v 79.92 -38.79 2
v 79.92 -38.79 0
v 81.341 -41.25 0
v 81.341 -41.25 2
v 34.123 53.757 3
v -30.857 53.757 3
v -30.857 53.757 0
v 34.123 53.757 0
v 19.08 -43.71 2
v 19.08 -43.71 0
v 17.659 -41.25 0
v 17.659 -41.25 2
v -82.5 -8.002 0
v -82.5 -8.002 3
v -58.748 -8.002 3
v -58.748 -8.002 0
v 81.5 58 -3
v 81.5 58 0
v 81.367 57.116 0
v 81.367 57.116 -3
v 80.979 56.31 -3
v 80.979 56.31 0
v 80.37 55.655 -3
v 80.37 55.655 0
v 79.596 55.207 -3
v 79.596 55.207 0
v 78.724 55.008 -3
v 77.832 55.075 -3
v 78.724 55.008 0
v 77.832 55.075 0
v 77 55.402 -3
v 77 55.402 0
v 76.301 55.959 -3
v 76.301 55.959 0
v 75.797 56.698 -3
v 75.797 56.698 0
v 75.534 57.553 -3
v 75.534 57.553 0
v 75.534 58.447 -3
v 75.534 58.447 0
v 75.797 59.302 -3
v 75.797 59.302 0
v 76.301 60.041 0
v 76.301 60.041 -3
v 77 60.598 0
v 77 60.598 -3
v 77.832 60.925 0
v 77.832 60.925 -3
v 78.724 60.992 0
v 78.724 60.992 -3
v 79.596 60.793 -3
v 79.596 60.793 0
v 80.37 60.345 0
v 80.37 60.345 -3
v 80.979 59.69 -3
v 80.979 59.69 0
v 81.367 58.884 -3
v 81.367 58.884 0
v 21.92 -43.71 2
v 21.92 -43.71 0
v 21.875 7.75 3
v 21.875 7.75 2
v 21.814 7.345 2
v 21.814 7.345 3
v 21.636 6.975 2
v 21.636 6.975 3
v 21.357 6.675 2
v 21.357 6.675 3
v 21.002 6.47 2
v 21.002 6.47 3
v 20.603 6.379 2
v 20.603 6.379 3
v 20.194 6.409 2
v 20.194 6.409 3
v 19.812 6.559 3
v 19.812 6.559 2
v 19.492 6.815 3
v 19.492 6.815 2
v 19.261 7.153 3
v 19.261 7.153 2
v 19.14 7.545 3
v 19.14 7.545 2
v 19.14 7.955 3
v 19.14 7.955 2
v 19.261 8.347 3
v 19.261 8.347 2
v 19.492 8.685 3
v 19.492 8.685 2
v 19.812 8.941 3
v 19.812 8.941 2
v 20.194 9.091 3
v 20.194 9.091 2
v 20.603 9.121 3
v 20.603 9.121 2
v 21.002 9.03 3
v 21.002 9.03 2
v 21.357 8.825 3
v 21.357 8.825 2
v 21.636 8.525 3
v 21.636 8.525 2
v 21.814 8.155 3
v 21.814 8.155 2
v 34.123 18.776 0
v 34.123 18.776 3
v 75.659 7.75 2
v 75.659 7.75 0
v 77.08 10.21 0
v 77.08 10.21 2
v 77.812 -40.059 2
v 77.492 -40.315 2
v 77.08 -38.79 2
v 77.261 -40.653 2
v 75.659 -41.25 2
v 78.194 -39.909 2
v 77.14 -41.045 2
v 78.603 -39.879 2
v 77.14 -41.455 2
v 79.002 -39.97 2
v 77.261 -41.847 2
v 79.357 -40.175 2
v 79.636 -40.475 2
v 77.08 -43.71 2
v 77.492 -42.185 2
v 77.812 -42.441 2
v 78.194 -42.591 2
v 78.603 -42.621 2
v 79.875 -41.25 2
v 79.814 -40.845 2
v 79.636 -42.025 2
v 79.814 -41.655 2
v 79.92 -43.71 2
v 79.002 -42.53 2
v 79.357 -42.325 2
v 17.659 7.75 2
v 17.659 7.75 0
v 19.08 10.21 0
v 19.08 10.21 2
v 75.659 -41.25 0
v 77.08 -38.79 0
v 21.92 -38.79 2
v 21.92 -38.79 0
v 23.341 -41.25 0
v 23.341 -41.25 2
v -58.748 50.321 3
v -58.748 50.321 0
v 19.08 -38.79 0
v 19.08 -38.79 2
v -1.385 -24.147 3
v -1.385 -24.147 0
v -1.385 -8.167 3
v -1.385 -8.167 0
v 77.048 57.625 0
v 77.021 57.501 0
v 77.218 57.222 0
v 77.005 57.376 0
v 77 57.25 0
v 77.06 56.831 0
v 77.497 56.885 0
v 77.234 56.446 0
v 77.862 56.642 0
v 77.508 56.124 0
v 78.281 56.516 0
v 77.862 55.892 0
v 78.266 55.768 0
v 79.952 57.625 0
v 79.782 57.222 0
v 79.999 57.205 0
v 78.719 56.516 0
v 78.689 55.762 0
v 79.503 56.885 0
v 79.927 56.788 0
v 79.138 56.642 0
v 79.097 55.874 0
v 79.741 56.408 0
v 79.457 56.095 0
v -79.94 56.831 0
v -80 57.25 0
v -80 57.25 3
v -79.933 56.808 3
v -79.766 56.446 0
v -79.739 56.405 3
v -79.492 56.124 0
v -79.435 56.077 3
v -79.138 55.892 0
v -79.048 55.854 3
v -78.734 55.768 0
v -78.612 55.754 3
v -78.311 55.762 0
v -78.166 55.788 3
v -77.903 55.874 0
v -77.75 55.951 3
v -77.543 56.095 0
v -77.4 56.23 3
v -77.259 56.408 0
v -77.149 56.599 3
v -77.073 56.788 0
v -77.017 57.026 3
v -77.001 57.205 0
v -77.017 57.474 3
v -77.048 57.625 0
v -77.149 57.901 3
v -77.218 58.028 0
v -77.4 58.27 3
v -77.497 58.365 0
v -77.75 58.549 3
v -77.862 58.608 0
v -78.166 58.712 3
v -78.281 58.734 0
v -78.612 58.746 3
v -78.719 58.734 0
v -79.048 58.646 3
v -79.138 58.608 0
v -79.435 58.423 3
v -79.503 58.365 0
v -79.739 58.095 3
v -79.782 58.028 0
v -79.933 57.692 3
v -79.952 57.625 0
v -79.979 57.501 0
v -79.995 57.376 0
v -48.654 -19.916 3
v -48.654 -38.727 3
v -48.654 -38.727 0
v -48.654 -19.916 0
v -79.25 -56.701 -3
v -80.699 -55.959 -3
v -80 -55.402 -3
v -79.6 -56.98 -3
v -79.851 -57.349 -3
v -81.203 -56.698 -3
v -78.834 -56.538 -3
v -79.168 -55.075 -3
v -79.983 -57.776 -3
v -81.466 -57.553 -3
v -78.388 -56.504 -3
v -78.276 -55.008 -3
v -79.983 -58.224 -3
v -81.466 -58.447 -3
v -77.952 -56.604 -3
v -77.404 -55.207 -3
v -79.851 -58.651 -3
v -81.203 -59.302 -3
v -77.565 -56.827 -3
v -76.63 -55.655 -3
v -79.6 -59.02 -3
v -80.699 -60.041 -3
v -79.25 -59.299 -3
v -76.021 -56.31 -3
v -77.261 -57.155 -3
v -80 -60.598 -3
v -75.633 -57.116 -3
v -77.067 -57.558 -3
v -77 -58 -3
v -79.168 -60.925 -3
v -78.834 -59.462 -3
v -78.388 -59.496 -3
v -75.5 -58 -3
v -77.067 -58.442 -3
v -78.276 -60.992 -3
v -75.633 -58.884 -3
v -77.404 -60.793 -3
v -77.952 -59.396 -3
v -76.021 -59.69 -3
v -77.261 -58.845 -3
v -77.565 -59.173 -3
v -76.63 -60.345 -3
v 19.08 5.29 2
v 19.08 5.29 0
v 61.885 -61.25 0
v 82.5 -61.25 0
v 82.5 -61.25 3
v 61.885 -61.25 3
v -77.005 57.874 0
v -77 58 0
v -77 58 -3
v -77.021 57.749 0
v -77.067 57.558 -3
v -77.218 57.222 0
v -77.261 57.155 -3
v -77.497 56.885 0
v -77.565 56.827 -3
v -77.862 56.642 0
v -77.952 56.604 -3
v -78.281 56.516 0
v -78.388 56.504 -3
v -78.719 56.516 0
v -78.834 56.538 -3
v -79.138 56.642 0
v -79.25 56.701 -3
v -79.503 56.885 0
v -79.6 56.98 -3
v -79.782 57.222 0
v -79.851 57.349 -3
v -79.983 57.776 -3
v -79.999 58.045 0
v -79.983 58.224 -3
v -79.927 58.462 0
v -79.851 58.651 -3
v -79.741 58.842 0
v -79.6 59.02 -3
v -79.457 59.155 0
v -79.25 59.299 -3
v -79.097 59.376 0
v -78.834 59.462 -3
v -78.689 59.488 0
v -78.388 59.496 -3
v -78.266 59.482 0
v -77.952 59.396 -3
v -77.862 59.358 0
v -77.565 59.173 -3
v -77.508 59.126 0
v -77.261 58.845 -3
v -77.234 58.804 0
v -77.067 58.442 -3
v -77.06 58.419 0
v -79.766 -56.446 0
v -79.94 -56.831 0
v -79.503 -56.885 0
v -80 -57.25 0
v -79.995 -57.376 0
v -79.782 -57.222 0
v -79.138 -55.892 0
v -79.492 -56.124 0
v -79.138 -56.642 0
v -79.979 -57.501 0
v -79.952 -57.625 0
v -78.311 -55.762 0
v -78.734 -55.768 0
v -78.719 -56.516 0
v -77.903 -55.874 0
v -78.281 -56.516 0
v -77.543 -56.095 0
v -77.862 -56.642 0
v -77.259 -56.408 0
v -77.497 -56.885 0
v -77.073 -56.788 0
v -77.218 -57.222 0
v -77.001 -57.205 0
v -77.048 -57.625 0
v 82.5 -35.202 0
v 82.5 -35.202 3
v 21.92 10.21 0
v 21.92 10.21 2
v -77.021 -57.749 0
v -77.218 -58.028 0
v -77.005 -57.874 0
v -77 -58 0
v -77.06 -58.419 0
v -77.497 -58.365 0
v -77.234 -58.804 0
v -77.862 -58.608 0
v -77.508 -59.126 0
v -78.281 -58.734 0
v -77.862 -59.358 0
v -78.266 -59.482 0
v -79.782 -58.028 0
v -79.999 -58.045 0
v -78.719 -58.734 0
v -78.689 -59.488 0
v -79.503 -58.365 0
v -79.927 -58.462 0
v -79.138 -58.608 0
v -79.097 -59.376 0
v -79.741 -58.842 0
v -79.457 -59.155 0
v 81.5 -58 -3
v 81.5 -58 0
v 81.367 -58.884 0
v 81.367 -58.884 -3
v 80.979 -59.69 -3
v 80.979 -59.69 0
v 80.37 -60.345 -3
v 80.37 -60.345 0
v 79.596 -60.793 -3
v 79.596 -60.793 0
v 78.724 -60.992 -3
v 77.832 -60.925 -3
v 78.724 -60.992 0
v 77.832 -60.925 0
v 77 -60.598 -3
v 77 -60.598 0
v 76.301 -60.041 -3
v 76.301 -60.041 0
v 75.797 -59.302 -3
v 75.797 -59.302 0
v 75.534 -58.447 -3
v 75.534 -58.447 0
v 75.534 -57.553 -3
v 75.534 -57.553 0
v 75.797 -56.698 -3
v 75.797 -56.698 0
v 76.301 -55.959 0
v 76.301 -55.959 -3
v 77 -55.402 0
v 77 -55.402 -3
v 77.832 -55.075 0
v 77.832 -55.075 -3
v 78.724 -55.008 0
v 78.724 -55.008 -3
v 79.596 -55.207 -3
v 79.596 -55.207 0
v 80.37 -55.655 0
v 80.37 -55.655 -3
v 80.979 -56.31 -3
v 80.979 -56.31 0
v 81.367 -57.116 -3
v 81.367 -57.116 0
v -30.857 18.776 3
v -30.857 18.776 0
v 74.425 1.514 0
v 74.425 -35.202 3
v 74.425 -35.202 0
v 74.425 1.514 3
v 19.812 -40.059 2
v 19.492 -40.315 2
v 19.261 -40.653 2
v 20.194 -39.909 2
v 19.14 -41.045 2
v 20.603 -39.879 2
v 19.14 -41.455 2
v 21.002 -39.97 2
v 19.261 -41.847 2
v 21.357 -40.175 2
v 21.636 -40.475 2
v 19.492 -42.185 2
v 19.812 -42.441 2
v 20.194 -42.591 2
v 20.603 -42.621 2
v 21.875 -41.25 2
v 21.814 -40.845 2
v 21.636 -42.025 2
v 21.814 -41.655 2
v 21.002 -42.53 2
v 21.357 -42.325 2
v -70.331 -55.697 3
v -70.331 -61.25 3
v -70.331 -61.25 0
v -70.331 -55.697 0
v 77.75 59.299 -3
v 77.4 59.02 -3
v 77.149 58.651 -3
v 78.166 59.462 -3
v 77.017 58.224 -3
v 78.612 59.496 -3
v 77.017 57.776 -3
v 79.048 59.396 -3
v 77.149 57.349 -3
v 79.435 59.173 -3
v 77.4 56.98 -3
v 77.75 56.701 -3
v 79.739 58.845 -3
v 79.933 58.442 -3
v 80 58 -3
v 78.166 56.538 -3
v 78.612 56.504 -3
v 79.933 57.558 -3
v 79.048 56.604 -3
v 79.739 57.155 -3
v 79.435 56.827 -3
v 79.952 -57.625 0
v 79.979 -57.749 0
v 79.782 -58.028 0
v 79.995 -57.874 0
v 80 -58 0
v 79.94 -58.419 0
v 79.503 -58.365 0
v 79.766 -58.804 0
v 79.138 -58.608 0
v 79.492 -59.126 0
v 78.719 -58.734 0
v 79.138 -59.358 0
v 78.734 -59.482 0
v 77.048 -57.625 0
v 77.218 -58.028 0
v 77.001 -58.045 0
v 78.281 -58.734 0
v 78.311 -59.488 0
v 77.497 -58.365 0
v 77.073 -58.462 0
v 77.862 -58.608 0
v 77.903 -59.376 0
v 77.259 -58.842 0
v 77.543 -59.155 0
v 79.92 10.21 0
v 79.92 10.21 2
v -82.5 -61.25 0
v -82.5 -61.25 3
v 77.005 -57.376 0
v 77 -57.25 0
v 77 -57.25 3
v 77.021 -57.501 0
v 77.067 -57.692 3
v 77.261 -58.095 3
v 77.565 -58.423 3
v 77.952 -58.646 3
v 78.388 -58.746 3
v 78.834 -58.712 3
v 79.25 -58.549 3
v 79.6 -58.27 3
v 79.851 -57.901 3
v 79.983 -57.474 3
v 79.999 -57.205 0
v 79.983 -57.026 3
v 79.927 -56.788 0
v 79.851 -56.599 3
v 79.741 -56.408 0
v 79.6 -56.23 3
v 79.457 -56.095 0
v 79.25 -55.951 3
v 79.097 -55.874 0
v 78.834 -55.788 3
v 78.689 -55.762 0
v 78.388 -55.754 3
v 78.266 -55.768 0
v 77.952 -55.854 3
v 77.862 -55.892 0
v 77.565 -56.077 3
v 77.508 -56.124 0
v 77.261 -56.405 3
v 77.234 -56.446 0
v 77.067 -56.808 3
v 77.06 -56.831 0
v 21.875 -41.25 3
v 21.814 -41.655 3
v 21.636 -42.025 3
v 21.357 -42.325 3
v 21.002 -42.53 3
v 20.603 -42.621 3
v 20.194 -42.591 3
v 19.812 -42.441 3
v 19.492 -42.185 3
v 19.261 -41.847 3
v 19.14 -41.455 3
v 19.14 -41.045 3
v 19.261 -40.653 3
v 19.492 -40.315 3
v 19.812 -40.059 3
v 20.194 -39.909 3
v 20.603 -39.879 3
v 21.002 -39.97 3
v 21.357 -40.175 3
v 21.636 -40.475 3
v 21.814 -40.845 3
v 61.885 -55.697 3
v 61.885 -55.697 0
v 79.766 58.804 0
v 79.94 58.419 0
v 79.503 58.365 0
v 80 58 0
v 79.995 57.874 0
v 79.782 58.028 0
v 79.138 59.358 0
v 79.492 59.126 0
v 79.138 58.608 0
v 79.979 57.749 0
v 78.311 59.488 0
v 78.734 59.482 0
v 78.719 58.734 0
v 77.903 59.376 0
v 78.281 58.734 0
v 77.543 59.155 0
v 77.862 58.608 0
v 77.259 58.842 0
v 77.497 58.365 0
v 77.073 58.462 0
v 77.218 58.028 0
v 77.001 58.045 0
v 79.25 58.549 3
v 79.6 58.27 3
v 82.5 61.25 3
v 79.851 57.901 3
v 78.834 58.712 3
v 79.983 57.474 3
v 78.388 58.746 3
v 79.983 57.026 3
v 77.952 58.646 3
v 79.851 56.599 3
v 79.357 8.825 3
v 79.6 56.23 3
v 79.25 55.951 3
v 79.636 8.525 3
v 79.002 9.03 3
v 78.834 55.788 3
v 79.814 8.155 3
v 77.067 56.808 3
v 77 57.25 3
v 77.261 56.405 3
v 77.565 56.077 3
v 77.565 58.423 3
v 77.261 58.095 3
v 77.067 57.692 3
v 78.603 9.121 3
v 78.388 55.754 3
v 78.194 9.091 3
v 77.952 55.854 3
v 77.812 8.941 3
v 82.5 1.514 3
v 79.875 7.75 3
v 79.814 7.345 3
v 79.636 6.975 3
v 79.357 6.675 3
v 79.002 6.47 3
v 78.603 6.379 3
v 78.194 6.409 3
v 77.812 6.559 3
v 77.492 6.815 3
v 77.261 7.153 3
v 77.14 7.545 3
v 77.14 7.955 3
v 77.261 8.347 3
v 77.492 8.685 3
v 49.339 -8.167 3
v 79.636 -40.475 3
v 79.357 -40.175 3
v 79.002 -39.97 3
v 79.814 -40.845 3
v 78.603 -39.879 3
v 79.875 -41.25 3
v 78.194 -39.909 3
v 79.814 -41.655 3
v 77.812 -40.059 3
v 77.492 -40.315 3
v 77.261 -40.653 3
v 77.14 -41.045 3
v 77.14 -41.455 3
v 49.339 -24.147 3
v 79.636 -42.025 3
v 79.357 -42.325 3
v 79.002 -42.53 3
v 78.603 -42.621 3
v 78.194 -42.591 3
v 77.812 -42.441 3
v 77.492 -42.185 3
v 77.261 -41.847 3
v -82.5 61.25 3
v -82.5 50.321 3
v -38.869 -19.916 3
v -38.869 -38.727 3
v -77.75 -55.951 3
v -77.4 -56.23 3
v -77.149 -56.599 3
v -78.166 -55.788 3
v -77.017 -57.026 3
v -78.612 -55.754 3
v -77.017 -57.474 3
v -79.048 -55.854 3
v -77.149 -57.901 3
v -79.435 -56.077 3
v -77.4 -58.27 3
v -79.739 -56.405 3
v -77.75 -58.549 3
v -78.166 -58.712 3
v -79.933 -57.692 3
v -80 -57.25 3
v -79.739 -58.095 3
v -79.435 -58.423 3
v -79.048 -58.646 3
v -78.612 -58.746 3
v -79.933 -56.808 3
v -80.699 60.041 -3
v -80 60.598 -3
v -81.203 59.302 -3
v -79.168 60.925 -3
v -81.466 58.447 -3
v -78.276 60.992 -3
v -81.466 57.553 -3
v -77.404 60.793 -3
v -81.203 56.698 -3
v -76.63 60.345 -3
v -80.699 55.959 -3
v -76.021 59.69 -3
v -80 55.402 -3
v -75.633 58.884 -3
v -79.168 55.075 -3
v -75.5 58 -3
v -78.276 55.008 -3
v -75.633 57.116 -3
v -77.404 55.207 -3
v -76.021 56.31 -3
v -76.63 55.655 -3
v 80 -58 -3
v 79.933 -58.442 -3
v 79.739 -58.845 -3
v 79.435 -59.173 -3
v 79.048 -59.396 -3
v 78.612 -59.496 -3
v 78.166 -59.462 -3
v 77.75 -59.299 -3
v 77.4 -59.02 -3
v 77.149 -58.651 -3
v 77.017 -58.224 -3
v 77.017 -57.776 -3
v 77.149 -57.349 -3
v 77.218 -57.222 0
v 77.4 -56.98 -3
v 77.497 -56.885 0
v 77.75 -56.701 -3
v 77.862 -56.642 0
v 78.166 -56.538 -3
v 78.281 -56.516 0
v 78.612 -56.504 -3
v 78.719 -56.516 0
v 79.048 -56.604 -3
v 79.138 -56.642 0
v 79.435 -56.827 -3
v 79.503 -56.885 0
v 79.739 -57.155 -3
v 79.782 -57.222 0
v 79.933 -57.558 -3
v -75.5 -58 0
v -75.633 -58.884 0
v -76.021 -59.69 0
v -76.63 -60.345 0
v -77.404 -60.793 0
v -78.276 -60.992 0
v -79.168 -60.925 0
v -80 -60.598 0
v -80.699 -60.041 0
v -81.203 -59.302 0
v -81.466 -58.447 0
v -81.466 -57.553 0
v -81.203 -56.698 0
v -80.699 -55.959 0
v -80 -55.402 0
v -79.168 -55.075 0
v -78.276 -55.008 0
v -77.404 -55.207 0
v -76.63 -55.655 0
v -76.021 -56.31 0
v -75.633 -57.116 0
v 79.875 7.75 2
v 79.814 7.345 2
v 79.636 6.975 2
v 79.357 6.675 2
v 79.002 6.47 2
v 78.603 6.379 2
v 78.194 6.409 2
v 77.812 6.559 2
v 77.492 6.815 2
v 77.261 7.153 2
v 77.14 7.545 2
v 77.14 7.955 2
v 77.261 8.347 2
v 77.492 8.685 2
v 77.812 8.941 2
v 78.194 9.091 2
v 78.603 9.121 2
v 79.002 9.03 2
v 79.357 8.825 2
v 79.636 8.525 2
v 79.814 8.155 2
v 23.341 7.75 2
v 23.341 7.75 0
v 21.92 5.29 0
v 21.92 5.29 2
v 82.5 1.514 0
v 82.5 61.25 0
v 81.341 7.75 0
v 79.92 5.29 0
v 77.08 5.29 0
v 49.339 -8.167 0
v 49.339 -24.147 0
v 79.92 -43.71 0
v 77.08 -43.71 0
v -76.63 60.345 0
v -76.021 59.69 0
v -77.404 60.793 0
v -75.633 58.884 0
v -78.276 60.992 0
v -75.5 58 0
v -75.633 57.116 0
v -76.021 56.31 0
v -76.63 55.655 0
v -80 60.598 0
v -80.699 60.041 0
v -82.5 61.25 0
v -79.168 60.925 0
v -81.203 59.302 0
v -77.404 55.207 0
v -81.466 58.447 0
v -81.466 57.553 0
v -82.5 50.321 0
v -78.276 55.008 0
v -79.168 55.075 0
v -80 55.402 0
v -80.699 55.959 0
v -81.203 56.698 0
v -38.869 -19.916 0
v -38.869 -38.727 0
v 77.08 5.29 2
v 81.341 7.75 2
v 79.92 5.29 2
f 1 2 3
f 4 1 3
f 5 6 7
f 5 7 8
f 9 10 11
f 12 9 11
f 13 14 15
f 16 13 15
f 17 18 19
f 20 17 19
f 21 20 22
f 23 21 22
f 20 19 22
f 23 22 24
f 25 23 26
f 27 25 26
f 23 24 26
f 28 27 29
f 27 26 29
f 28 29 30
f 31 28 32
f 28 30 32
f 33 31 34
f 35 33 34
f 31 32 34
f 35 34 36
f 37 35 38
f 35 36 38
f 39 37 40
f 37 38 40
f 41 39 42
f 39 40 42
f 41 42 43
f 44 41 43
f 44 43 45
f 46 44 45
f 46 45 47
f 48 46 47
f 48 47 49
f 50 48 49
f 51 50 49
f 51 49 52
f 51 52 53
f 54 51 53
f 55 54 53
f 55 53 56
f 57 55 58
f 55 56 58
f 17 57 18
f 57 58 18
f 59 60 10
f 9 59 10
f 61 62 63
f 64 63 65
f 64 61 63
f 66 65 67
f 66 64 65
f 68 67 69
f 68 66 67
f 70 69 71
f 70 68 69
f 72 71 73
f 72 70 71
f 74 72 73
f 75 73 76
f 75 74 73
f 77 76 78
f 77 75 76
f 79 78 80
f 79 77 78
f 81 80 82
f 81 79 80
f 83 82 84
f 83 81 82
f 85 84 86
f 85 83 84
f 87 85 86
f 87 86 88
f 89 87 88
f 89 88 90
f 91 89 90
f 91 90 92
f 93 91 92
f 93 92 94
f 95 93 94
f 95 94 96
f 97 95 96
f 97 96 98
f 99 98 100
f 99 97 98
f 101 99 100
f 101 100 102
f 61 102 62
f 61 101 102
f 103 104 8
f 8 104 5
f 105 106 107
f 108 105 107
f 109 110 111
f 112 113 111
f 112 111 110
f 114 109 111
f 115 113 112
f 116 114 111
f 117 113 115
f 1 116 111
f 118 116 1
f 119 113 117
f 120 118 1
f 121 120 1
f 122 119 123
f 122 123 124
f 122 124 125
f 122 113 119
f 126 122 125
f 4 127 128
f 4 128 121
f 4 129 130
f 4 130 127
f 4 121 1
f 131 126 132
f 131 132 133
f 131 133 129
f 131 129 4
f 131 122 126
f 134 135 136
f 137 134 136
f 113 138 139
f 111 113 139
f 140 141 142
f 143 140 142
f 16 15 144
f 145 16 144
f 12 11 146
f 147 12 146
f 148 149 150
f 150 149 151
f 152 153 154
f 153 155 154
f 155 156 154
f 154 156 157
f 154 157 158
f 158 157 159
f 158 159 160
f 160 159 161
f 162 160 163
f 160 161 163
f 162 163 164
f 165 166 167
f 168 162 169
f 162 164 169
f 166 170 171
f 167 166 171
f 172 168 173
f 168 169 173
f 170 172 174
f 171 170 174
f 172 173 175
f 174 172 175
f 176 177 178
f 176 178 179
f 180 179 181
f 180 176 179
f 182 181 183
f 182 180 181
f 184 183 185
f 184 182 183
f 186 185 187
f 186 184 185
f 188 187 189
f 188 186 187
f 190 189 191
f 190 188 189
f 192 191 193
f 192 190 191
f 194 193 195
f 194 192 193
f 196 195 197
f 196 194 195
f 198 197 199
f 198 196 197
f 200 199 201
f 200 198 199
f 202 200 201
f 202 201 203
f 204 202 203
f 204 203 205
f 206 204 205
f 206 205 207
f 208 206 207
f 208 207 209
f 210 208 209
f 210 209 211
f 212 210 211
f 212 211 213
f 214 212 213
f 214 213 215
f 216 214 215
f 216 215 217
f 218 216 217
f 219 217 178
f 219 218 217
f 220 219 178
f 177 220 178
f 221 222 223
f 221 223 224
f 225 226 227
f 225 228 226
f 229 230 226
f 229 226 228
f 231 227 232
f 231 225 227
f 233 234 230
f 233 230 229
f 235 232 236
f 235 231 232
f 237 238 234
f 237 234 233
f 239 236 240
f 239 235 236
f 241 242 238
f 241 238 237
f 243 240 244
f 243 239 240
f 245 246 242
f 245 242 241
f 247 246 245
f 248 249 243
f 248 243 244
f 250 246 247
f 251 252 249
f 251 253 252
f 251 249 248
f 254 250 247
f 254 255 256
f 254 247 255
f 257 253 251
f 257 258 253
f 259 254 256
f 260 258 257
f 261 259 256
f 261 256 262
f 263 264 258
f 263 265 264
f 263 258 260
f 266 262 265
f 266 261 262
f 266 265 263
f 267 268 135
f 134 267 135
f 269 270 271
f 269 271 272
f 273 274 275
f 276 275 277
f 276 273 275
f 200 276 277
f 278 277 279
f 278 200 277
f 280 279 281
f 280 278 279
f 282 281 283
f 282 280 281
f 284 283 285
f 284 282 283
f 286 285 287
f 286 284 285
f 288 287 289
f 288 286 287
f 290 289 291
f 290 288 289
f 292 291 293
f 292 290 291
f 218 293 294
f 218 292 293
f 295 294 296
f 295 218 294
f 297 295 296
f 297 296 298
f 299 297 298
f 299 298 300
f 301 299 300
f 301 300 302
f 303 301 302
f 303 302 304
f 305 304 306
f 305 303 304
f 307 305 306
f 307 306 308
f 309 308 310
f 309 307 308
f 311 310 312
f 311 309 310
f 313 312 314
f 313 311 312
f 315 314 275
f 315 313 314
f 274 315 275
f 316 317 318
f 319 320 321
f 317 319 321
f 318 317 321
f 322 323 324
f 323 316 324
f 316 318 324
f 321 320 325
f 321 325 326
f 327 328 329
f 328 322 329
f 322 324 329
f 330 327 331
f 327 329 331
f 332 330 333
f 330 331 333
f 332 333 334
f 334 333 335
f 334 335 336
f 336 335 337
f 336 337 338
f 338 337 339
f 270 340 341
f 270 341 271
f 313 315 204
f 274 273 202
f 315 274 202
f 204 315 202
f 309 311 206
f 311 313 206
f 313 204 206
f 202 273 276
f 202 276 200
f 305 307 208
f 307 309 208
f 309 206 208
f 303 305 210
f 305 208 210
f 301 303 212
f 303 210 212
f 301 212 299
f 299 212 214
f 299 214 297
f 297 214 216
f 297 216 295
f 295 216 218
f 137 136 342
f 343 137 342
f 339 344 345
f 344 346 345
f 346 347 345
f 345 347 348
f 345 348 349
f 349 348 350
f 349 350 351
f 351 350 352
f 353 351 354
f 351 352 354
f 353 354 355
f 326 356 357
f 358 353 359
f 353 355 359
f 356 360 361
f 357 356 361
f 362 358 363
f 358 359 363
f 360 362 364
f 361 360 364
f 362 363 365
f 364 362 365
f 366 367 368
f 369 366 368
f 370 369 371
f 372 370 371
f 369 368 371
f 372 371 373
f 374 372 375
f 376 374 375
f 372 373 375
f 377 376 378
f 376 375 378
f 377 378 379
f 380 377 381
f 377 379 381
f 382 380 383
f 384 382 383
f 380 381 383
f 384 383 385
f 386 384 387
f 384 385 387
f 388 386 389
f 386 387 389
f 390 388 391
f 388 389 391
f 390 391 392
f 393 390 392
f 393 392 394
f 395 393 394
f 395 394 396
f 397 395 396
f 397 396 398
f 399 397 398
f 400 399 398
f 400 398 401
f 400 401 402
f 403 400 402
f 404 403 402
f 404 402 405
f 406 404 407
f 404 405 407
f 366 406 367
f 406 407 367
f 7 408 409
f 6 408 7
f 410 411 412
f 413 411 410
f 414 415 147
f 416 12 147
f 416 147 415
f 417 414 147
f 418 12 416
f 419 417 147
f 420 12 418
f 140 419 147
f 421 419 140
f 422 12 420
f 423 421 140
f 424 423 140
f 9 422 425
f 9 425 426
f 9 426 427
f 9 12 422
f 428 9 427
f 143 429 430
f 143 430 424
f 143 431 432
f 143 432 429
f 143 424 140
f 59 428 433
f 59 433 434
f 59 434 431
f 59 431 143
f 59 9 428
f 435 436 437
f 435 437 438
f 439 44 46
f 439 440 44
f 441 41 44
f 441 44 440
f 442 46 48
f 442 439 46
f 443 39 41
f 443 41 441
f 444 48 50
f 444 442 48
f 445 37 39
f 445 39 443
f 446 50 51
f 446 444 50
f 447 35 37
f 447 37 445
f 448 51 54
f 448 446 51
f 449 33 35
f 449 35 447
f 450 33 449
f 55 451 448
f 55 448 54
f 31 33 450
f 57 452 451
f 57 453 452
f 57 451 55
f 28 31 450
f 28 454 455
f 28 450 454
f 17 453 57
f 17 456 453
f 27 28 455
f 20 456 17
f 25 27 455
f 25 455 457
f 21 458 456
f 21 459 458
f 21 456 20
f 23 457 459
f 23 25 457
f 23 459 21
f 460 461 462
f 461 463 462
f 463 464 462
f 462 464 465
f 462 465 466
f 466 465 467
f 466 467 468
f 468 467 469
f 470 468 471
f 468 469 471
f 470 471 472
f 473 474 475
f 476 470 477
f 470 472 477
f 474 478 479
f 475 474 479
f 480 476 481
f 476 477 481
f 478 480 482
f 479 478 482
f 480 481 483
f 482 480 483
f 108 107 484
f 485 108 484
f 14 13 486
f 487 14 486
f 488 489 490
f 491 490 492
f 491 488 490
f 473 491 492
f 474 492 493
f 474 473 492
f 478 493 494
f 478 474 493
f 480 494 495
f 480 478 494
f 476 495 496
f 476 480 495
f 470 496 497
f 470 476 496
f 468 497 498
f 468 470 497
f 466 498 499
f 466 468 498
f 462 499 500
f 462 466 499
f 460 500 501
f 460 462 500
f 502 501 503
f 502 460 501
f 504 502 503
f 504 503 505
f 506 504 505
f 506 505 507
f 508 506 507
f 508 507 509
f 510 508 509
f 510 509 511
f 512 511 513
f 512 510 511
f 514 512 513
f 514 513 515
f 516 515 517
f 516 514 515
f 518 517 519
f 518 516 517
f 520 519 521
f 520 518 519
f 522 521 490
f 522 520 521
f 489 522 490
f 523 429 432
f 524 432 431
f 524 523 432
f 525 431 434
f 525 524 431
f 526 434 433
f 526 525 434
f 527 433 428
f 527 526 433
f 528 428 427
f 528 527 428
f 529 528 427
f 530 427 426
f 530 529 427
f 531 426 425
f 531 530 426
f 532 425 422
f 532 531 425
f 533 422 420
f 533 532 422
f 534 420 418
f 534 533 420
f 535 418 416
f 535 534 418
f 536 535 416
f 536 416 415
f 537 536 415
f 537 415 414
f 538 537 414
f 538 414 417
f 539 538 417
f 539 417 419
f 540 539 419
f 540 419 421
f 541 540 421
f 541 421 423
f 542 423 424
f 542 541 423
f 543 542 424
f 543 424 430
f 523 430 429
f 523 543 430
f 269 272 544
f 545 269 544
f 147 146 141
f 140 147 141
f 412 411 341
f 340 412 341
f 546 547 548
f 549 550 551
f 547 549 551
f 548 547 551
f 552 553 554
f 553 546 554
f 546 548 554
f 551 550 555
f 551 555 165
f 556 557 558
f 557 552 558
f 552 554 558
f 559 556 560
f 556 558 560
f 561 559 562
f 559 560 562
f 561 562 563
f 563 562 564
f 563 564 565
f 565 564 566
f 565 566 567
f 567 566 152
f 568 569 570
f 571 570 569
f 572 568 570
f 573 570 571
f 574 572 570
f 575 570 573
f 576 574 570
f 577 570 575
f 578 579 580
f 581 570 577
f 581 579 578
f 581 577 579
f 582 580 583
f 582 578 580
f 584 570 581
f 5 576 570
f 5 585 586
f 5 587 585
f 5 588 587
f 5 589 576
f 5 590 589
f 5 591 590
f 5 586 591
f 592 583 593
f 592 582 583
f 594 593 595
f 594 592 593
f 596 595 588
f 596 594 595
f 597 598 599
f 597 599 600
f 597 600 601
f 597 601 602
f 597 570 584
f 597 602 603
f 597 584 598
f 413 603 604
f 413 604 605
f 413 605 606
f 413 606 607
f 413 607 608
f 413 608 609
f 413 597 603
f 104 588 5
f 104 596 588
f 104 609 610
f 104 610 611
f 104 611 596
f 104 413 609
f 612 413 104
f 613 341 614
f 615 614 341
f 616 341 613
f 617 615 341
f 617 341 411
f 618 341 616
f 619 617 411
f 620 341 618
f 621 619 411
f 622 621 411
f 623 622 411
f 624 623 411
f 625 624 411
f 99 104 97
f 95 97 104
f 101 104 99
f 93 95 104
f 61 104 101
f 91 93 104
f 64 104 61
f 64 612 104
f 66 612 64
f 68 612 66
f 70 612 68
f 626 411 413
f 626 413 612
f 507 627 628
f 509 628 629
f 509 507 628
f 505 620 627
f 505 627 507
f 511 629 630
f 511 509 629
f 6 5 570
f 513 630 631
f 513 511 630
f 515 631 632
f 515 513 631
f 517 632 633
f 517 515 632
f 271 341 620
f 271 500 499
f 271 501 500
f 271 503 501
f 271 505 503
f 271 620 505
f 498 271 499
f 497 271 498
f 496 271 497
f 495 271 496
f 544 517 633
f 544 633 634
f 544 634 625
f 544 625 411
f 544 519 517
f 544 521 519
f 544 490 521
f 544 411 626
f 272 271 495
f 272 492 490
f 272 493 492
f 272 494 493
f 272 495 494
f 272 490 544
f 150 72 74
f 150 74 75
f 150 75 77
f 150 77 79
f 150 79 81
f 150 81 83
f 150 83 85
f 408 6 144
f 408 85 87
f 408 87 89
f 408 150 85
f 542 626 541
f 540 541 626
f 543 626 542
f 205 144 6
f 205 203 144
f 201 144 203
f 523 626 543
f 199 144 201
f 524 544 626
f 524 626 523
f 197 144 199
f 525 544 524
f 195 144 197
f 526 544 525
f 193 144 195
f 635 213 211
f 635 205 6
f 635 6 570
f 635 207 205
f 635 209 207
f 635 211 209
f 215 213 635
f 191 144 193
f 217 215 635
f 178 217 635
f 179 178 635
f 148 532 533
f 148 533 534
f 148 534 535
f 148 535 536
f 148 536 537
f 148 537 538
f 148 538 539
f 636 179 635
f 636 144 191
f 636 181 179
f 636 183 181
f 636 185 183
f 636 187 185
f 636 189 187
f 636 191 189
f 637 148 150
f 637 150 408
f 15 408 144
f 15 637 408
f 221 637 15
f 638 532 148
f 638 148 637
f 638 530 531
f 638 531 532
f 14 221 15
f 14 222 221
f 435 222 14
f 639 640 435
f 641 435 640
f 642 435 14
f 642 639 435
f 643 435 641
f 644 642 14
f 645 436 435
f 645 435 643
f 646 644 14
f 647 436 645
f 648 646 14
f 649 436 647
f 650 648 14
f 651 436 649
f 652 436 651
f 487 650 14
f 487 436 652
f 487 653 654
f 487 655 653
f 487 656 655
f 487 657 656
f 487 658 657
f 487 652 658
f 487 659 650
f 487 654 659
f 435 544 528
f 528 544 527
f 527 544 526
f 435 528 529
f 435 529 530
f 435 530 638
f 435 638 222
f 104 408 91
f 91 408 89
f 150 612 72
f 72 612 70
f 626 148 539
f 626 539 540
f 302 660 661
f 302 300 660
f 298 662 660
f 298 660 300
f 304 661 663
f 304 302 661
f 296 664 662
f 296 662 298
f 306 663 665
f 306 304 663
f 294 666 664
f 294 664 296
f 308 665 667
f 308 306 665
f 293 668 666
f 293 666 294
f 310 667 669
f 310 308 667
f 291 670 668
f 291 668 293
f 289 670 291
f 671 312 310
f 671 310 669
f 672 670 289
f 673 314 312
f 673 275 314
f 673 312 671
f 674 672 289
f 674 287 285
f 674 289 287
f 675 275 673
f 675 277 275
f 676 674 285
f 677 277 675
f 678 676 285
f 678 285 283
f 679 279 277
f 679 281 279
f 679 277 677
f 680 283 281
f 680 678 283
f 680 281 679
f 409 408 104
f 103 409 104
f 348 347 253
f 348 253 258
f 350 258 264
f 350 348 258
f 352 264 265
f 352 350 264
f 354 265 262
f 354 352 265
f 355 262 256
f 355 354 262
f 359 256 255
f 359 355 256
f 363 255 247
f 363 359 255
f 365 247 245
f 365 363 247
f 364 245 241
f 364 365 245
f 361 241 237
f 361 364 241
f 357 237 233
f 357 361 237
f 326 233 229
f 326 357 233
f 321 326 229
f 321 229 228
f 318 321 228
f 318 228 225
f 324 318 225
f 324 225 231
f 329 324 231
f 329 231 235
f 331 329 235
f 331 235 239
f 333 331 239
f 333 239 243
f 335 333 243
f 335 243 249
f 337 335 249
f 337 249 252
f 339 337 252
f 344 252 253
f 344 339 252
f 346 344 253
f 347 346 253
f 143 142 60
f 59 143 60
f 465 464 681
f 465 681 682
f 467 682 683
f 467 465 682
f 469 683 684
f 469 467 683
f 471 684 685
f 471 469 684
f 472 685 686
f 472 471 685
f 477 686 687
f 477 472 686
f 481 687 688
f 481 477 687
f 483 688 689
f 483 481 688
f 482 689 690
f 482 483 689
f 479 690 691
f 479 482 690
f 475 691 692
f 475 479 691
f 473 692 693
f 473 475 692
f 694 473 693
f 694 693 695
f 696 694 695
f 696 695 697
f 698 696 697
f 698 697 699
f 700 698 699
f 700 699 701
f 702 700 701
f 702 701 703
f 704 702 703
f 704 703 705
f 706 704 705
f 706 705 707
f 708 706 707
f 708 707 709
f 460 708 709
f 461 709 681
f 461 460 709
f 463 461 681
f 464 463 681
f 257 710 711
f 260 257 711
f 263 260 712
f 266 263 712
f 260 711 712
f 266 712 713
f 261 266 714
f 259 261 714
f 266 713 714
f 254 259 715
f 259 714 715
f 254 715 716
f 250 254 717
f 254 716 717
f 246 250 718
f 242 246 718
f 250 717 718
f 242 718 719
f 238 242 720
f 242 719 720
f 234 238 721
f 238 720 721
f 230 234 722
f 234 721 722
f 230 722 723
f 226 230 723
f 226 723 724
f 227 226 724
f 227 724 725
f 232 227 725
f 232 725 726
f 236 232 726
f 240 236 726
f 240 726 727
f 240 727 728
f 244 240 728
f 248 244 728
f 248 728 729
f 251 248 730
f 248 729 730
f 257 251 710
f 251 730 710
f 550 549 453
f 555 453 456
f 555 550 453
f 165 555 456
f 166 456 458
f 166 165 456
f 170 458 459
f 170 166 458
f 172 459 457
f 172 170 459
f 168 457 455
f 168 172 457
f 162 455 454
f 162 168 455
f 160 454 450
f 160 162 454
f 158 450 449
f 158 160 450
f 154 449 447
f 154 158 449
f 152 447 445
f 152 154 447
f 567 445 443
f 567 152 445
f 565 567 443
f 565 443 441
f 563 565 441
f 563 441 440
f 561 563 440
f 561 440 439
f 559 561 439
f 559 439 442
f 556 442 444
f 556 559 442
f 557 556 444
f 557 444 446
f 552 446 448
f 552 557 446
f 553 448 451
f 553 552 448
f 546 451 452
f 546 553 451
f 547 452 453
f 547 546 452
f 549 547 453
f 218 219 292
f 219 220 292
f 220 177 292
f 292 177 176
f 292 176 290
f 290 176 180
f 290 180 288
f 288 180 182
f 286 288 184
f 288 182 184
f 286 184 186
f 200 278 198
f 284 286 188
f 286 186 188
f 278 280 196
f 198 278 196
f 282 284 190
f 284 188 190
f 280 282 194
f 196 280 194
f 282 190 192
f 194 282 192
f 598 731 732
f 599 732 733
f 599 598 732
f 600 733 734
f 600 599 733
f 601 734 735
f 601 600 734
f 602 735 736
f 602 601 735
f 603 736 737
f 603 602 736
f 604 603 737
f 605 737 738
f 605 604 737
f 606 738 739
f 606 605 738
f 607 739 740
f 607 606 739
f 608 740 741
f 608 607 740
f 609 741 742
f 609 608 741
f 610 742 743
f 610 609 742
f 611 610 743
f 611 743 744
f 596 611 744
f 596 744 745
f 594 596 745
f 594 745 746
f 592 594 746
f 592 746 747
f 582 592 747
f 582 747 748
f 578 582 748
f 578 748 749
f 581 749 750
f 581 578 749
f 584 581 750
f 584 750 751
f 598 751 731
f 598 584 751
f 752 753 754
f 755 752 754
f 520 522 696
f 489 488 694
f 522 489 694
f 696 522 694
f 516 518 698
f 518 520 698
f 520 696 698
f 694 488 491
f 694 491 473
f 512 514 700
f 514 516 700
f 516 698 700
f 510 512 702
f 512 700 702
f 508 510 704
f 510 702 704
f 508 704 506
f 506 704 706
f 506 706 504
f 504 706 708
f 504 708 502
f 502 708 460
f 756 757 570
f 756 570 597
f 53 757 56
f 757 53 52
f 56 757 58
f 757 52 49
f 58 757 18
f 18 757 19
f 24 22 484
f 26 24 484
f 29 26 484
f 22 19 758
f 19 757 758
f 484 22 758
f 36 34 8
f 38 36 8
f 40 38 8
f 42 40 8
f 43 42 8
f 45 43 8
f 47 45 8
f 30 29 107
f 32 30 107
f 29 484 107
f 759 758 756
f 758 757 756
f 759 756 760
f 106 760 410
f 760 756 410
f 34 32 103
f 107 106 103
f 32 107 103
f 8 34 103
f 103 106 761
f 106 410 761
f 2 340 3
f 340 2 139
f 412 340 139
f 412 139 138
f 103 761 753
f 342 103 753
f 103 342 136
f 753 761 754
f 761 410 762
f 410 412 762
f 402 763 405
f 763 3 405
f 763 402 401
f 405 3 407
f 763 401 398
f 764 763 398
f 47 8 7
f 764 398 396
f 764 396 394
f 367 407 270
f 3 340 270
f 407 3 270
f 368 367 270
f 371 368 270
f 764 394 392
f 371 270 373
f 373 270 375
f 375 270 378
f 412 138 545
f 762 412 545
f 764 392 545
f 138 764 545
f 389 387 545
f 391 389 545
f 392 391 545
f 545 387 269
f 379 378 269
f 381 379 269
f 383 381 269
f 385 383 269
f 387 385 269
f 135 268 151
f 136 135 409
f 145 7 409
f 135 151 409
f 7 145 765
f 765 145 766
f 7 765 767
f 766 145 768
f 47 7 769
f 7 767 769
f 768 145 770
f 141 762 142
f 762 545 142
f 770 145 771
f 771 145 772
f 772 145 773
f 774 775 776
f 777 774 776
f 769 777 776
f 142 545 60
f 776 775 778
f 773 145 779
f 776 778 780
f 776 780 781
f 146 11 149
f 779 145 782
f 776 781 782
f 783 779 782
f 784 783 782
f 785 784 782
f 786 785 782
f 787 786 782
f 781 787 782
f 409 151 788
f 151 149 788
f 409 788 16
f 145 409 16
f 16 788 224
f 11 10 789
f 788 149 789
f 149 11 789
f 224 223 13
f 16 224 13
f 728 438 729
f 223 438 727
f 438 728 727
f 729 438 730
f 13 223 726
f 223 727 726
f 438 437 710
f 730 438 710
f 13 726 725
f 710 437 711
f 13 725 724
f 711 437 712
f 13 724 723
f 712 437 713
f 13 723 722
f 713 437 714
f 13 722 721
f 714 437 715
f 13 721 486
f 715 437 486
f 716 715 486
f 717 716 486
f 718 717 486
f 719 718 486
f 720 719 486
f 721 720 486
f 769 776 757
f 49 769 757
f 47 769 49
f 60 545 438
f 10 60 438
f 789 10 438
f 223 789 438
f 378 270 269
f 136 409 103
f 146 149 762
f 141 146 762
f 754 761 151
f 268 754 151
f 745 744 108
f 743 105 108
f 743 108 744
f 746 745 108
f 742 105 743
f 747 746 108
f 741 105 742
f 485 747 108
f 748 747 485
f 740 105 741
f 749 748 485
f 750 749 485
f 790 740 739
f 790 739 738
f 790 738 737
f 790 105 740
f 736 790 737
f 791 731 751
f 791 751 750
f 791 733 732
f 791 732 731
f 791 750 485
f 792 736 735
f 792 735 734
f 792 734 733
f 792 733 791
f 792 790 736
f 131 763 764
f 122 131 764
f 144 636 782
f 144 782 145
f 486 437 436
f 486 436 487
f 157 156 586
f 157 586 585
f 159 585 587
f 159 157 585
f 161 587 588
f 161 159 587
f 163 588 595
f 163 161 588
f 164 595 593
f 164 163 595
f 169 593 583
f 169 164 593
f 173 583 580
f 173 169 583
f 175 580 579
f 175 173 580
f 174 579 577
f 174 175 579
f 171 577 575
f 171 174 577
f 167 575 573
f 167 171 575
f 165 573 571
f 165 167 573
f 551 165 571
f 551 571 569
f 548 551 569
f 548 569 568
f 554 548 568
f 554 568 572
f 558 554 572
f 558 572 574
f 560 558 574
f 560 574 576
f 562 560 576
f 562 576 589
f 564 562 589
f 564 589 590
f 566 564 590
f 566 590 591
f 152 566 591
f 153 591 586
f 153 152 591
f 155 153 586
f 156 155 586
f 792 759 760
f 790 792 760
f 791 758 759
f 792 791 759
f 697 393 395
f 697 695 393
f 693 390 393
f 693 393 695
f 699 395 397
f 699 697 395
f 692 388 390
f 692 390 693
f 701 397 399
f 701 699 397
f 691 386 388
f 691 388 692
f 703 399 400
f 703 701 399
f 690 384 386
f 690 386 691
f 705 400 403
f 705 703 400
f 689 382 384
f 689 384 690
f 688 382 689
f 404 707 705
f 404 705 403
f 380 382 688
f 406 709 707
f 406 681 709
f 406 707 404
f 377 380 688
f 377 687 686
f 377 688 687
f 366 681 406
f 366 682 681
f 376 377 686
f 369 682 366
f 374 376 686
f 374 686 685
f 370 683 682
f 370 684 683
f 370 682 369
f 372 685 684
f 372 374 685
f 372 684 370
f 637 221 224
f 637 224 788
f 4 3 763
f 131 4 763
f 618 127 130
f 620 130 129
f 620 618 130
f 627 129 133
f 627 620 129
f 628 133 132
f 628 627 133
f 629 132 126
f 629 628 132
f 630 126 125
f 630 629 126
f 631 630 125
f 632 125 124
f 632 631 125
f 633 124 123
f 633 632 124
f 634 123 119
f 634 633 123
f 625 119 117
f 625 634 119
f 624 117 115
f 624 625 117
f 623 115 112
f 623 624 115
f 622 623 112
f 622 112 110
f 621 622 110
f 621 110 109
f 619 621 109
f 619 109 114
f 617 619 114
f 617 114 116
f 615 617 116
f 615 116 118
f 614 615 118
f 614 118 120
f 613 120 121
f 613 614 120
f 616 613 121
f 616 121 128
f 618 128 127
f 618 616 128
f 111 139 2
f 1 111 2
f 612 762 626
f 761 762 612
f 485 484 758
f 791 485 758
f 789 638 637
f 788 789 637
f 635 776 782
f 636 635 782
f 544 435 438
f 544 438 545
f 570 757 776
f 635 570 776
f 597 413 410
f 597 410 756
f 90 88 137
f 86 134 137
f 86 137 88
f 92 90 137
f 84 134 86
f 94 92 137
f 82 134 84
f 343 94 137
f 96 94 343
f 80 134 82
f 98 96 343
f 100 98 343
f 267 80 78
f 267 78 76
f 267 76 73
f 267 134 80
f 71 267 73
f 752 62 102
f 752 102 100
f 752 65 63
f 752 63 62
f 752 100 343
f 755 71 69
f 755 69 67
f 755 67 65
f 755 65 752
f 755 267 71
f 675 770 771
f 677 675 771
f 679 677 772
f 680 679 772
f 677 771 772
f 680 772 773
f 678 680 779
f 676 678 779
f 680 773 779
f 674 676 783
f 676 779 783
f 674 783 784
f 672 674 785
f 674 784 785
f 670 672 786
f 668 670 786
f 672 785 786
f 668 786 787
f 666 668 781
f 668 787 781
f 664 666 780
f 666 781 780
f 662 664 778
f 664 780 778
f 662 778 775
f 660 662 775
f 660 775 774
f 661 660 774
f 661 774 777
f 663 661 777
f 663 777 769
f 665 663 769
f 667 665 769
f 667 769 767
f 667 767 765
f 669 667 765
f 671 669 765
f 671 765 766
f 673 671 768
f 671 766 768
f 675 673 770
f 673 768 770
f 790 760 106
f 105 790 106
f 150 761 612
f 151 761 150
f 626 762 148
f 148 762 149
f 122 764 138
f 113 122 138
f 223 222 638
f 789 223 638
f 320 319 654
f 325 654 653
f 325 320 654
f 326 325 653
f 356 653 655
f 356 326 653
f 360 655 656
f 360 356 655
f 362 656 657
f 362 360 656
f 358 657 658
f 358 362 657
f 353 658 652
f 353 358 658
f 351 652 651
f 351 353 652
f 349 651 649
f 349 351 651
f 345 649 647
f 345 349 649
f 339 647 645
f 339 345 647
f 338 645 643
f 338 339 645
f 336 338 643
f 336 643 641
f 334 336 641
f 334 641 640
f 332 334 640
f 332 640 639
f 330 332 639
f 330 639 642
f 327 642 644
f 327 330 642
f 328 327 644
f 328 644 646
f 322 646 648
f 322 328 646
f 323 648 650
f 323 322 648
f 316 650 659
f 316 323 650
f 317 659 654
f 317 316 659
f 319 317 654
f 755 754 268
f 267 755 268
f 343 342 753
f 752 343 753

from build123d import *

# Parameters (mm, degrees)
CROQUIS9_W              = 165
CROQUIS9_H              = 122.5
CROQUIS9_R              = 1.5
SALIENTE_EXTRUIR7_DEPTH = 3
CROQUIS10_R             = 3
CROQUIS10_R_2           = 1.5
SALIENTE_EXTRUIR4_DEPTH = 3
CROQUIS13_R             = 1.375
CORTAR_EXTRUIR6_DEPTH   = 7
CORTAR_EXTRUIR9_DEPTH   = 2
CROQUIS19_W             = 23.751706854
CROQUIS19_H             = 58.322995046
CORTAR_EXTRUIR11_DEPTH  = 7
CROQUIS20_W             = 8.074798139
CROQUIS20_H             = 36.716786424
CORTAR_EXTRUIR12_DEPTH  = 7
CROQUIS21_W             = 132.215541909
CROQUIS21_H             = 5.552865293
CORTAR_EXTRUIR13_DEPTH  = 7
CROQUIS22_W             = 64.97984938
CROQUIS22_H             = 34.980531845
CORTAR_EXTRUIR14_DEPTH  = 10
CROQUIS23_W             = 9.785151637
CROQUIS23_H             = 18.811760375
CORTAR_EXTRUIR15_DEPTH  = 7
CROQUIS24_W             = 50.724588702
CROQUIS24_H             = 15.98003992
CORTAR_EXTRUIR16_DEPTH  = 10


with BuildPart() as part:
    # Croquis9 → Saliente-Extruir7 (new body)
    with BuildSketch(Plane(origin=(0, -39.711212197, 0), x_dir=(-1, 0, 0), z_dir=(0, 0, 1))):
        with Locations((0, -39.711212197)):
            Rectangle(CROQUIS9_W, CROQUIS9_H)
        with Locations((-78.5, 17.538787803)):
            Circle(CROQUIS9_R, mode=Mode.SUBTRACT)
        with Locations((78.5, 17.538787803)):
            Circle(CROQUIS9_R, mode=Mode.SUBTRACT)
        with Locations((-78.5, -96.961212197)):
            Circle(CROQUIS9_R, mode=Mode.SUBTRACT)
        with Locations((78.5, -96.961212197)):
            Circle(CROQUIS9_R, mode=Mode.SUBTRACT)
    extrude(amount=SALIENTE_EXTRUIR7_DEPTH)

    # Croquis10 → Saliente-Extruir4 (add)
    with BuildSketch(Plane(origin=(0, -39.711212197, 0), x_dir=(1, 0, 0), z_dir=(0, 0, -1))):
        with Locations((-78.5, 18.288787803)):
            Circle(CROQUIS10_R)
        with Locations((-78.5, 18.288787803)):
            Circle(CROQUIS10_R_2, mode=Mode.SUBTRACT)
        with Locations((78.5, 18.288787803)):
            Circle(CROQUIS10_R)
        with Locations((78.5, 18.288787803)):
            Circle(CROQUIS10_R_2, mode=Mode.SUBTRACT)
        with Locations((78.5, -97.711212197)):
            Circle(CROQUIS10_R)
        with Locations((78.5, -97.711212197)):
            Circle(CROQUIS10_R_2, mode=Mode.SUBTRACT)
        with Locations((-78.5, -97.711212197)):
            Circle(CROQUIS10_R)
        with Locations((-78.5, -97.711212197)):
            Circle(CROQUIS10_R_2, mode=Mode.SUBTRACT)
    extrude(amount=SALIENTE_EXTRUIR4_DEPTH)

    # Croquis13 → Cortar-Extruir6 (cut, through all)
    with BuildSketch(Plane(origin=(0, -58.652466741, 3), x_dir=(1, 0, 0), z_dir=(0, 0, -1))):
        with Locations((20.5, -17.402466741)):
            Circle(CROQUIS13_R)
        with Locations((78.5, -17.402466741)):
            Circle(CROQUIS13_R)
        with Locations((20.5, -66.402466741)):
            Circle(CROQUIS13_R)
        with Locations((78.5, -66.402466741)):
            Circle(CROQUIS13_R)
    extrude(amount=CORTAR_EXTRUIR6_DEPTH, mode=Mode.SUBTRACT)

    # Croquis17 → Cortar-Extruir9 (cut)
    with BuildSketch(Plane(origin=(0, -39.711212197, 0), x_dir=(1, 0, 0), z_dir=(0, 0, -1))):
        Polygon((23.340563324, 1.538787803), (21.920281662, 3.998787803), (19.079718338, 3.998787803), (17.659436676, 1.538787803), (19.079718338, -0.921212197), (21.920281662, -0.921212197), align=None)
        Polygon((81.340563324, 1.538787803), (79.920281662, 3.998787803), (77.079718338, 3.998787803), (75.659436676, 1.538787803), (77.079718338, -0.921212197), (79.920281662, -0.921212197), align=None)
        Polygon((81.340563324, -47.461212197), (79.920281662, -45.001212197), (77.079718338, -45.001212197), (75.659436676, -47.461212197), (77.079718338, -49.921212197), (79.920281662, -49.921212197), align=None)
        Polygon((23.340563324, -47.461212197), (21.920281662, -45.001212197), (19.079718338, -45.001212197), (17.659436676, -47.461212197), (19.079718338, -49.921212197), (21.920281662, -49.921212197), align=None)
    extrude(amount=-CORTAR_EXTRUIR9_DEPTH, mode=Mode.SUBTRACT)

    # Croquis19 → Cortar-Extruir11 (cut, through all)
    with BuildSketch(Plane.XY.offset(3)):
        with Locations((-70.624146573, 21.159042343)):
            Rectangle(CROQUIS19_W, CROQUIS19_H)
    extrude(amount=-CORTAR_EXTRUIR11_DEPTH, mode=Mode.SUBTRACT)

    # Croquis20 → Cortar-Extruir12 (cut, through all)
    with BuildSketch(Plane.XY.offset(3)):
        with Locations((78.462600931, -16.844106748)):
            Rectangle(CROQUIS20_W, CROQUIS20_H)
    extrude(amount=-CORTAR_EXTRUIR12_DEPTH, mode=Mode.SUBTRACT)

    # Croquis21 → Cortar-Extruir13 (cut, through all)
    with BuildSketch(Plane.XY.offset(3)):
        with Locations((-4.222973471, -58.473567354)):
            Rectangle(CROQUIS21_W, CROQUIS21_H)
    extrude(amount=-CORTAR_EXTRUIR13_DEPTH, mode=Mode.SUBTRACT)

    # Croquis22 → Cortar-Extruir14 (cut)
    with BuildSketch(Plane.XY.offset(3)):
        with Locations((1.632848722, 36.266393101)):
            Rectangle(CROQUIS22_W, CROQUIS22_H)
    extrude(amount=-CORTAR_EXTRUIR14_DEPTH, mode=Mode.SUBTRACT)

    # Croquis23 → Cortar-Extruir15 (cut, through all)
    with BuildSketch(Plane.XY.offset(3)):
        with Locations((-43.761194105, -29.321605041)):
            Rectangle(CROQUIS23_W, CROQUIS23_H)
    extrude(amount=-CORTAR_EXTRUIR15_DEPTH, mode=Mode.SUBTRACT)

    # Croquis24 → Cortar-Extruir16 (cut)
    with BuildSketch(Plane(origin=(0, 0, 0), x_dir=(-1, 0, 0), z_dir=(0, 0, -1))):
        with Locations((-23.977071959, -16.156592187)):
            Rectangle(CROQUIS24_W, CROQUIS24_H)
    extrude(amount=-CORTAR_EXTRUIR16_DEPTH, mode=Mode.SUBTRACT)


solid = part.part
